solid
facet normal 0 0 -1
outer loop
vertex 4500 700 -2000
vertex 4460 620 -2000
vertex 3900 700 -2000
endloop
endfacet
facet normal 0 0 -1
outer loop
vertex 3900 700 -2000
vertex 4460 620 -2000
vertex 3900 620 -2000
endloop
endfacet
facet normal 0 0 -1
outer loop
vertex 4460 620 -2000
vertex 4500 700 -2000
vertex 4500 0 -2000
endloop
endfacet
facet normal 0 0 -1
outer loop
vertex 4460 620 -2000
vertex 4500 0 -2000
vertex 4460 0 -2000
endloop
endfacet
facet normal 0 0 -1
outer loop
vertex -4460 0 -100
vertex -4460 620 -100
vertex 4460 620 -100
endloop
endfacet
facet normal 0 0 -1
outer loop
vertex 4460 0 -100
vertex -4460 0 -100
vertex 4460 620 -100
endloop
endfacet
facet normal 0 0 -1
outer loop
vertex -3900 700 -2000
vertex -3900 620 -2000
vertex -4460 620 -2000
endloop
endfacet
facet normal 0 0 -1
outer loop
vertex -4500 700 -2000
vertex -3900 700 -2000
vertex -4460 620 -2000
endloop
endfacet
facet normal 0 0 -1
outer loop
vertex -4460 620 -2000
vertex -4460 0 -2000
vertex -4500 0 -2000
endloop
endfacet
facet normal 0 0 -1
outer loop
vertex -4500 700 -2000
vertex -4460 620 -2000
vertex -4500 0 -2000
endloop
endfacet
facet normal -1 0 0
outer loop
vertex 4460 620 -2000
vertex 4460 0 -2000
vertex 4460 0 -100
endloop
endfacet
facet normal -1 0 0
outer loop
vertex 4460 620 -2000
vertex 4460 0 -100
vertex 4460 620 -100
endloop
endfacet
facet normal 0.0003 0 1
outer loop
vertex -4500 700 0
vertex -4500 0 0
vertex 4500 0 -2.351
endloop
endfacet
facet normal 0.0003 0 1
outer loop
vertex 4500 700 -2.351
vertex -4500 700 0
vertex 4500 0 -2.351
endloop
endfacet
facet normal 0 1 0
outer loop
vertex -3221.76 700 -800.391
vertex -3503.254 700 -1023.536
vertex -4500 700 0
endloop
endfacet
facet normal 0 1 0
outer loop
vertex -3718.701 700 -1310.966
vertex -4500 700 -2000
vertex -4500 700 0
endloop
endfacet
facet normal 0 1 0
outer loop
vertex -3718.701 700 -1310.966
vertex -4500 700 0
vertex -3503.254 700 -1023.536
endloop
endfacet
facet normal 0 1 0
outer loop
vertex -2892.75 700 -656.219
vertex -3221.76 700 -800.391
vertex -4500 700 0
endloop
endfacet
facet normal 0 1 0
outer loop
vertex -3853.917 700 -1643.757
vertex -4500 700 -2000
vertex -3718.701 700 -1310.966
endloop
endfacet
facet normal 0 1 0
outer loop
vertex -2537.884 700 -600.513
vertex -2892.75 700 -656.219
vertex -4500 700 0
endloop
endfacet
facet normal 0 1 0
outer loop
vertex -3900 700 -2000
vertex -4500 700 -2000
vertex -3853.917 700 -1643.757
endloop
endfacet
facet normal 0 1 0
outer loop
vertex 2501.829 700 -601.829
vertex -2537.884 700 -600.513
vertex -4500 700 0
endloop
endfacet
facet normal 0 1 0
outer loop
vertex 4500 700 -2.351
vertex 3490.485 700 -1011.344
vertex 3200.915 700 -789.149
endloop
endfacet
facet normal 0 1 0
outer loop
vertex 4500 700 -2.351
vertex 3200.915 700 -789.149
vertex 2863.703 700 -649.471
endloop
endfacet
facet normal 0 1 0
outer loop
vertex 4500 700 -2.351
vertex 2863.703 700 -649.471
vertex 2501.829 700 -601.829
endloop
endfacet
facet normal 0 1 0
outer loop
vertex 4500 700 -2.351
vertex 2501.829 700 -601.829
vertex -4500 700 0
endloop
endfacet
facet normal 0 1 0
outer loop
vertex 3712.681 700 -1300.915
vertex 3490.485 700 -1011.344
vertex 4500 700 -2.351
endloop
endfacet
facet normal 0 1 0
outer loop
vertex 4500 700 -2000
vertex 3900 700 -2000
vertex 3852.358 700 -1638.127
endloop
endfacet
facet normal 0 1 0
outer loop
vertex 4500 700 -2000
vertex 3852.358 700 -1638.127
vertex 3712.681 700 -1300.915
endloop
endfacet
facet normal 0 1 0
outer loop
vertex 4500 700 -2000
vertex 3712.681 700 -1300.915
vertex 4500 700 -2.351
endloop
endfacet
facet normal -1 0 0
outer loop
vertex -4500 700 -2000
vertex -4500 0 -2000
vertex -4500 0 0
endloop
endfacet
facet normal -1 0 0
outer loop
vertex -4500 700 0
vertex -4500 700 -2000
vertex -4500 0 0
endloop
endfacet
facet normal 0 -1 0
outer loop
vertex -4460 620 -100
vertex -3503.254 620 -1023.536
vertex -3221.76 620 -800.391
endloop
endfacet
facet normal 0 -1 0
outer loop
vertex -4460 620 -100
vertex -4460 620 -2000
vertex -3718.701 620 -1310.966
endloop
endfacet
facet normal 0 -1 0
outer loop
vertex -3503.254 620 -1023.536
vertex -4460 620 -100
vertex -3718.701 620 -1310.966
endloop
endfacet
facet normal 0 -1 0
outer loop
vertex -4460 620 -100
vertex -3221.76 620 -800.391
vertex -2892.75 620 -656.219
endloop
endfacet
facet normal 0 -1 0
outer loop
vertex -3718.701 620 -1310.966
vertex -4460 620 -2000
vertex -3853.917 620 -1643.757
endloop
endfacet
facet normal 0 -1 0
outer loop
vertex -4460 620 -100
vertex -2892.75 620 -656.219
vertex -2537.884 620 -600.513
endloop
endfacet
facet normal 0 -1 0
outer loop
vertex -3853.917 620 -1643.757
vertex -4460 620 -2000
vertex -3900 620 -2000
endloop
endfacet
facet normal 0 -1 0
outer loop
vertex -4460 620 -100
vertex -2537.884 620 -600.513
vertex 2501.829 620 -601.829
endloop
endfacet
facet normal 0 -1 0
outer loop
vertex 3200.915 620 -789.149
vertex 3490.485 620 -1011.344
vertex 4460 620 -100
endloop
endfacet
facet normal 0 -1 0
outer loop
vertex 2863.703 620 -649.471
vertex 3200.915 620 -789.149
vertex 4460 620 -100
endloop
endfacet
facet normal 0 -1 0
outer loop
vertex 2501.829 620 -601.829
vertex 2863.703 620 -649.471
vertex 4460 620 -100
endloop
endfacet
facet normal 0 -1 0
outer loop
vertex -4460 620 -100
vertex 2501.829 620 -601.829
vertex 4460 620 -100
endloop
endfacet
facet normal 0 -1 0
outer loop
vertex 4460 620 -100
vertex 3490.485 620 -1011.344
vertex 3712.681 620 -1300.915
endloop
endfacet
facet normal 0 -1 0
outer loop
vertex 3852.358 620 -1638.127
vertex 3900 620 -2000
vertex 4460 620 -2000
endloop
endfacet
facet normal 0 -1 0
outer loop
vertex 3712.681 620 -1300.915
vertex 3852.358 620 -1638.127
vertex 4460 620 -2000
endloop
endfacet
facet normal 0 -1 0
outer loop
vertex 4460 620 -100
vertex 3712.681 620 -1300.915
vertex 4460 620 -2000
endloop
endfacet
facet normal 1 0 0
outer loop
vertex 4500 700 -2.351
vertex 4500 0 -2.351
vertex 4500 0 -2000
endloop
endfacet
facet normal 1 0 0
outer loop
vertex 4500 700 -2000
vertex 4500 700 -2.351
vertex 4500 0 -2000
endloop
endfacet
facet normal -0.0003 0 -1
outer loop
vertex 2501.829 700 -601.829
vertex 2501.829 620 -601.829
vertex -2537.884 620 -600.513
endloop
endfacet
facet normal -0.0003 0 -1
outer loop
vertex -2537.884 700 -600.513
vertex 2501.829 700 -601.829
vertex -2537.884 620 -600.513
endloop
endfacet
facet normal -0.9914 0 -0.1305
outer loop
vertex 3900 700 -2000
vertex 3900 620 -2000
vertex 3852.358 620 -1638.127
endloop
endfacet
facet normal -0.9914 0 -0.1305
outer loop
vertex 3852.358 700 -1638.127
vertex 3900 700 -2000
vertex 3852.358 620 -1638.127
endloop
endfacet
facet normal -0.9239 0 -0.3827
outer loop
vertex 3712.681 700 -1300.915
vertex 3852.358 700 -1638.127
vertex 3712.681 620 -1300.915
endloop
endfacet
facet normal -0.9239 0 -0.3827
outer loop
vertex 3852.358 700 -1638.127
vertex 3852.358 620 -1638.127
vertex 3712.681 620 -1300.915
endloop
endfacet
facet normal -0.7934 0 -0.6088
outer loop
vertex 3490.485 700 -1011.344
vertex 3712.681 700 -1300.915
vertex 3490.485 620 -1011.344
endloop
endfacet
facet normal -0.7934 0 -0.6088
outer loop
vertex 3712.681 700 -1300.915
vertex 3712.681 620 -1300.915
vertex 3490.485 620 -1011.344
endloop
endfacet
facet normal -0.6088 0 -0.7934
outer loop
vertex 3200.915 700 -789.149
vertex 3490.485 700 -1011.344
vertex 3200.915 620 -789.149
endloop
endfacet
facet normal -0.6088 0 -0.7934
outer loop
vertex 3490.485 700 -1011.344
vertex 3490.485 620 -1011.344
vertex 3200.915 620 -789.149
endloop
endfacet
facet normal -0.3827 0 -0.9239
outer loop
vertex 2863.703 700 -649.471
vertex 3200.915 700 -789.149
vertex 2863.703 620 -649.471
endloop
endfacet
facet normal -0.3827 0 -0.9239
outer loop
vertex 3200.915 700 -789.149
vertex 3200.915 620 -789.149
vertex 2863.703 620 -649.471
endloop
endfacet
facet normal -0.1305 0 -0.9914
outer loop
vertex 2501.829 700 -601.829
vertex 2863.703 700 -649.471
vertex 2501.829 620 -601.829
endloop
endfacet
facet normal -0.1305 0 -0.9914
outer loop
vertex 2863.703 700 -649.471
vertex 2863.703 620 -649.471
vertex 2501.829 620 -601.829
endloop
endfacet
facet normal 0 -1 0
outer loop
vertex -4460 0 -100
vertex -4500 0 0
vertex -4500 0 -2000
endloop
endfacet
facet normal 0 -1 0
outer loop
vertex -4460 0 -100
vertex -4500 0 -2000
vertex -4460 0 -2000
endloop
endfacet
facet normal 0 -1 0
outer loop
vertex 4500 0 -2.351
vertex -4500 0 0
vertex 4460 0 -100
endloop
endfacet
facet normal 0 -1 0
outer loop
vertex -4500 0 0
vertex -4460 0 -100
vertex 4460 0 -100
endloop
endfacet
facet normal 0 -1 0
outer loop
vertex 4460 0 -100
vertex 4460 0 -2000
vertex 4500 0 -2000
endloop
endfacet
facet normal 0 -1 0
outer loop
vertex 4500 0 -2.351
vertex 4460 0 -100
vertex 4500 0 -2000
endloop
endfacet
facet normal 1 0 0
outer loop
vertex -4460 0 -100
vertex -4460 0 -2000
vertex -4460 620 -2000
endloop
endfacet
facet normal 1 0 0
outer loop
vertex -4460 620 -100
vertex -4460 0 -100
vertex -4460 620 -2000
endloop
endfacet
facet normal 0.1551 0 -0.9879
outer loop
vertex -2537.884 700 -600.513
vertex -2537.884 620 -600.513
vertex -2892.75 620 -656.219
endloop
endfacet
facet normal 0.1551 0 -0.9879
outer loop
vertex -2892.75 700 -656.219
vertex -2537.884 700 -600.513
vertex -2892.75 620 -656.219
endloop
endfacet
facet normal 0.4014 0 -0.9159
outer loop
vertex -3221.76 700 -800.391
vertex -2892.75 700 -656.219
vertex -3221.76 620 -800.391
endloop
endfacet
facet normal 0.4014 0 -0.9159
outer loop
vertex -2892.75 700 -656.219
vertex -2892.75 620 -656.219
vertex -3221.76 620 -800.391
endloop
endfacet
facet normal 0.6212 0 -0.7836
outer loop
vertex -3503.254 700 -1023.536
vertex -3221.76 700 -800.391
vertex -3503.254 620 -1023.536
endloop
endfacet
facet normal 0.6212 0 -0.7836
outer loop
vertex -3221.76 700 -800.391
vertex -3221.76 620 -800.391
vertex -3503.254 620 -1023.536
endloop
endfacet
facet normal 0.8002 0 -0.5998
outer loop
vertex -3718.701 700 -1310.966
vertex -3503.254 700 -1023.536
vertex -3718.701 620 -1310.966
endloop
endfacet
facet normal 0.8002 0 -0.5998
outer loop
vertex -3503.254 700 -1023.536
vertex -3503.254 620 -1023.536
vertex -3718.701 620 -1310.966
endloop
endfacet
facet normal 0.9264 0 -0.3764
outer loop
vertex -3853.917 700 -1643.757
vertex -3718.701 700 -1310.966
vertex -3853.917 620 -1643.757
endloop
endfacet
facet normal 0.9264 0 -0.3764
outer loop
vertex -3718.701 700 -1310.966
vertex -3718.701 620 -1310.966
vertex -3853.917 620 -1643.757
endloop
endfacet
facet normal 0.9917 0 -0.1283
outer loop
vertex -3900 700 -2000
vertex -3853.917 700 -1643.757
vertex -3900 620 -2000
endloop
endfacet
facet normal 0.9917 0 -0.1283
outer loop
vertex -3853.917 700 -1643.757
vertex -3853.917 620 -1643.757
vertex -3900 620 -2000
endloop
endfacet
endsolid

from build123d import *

# Parameters (mm, degrees)
BOSS_EXTRUDE1_DEPTH = 700
SKETCH6_W           = 8920
SKETCH6_H           = 620
CUT_EXTRUDE1_DEPTH  = 2400


with BuildPart() as part:
    # Sketch1 → Boss-Extrude1 (new body)
    with BuildSketch(Plane(origin=(0, 0, 0), x_dir=(1, 0, 0), z_dir=(0, 1, 0))):
        with BuildLine():
            Line((-4500, 0), (4499.999692814, 2.35145561))
            Line((4499.999692814, 2.35145561), (4500, 2000))
            Line((4500, 2000), (3900, 2000))
            ThreePointArc((3900, 2000), (3490.485314986, 1011.344093449), (2501.829408435, 601.829408435))
            Line((2501.829408435, 601.829408435), (-2537.88413688, 600.512668091))
            ThreePointArc((-2537.88413688, 600.512668091), (-3503.254153152, 1023.536429669), (-3900, 2000))
            Line((-3900, 2000), (-4500, 2000))
            Line((-4500, 2000), (-4500, 0))
        make_face()
    extrude(amount=BOSS_EXTRUDE1_DEPTH)

    # Sketch6 → Cut-Extrude1 (cut)
    with BuildSketch(Plane.XY.offset(-2500)):
        with Locations((0, 310)):
            Rectangle(SKETCH6_W, SKETCH6_H)
    extrude(amount=CUT_EXTRUDE1_DEPTH, mode=Mode.SUBTRACT)


solid = part.part
